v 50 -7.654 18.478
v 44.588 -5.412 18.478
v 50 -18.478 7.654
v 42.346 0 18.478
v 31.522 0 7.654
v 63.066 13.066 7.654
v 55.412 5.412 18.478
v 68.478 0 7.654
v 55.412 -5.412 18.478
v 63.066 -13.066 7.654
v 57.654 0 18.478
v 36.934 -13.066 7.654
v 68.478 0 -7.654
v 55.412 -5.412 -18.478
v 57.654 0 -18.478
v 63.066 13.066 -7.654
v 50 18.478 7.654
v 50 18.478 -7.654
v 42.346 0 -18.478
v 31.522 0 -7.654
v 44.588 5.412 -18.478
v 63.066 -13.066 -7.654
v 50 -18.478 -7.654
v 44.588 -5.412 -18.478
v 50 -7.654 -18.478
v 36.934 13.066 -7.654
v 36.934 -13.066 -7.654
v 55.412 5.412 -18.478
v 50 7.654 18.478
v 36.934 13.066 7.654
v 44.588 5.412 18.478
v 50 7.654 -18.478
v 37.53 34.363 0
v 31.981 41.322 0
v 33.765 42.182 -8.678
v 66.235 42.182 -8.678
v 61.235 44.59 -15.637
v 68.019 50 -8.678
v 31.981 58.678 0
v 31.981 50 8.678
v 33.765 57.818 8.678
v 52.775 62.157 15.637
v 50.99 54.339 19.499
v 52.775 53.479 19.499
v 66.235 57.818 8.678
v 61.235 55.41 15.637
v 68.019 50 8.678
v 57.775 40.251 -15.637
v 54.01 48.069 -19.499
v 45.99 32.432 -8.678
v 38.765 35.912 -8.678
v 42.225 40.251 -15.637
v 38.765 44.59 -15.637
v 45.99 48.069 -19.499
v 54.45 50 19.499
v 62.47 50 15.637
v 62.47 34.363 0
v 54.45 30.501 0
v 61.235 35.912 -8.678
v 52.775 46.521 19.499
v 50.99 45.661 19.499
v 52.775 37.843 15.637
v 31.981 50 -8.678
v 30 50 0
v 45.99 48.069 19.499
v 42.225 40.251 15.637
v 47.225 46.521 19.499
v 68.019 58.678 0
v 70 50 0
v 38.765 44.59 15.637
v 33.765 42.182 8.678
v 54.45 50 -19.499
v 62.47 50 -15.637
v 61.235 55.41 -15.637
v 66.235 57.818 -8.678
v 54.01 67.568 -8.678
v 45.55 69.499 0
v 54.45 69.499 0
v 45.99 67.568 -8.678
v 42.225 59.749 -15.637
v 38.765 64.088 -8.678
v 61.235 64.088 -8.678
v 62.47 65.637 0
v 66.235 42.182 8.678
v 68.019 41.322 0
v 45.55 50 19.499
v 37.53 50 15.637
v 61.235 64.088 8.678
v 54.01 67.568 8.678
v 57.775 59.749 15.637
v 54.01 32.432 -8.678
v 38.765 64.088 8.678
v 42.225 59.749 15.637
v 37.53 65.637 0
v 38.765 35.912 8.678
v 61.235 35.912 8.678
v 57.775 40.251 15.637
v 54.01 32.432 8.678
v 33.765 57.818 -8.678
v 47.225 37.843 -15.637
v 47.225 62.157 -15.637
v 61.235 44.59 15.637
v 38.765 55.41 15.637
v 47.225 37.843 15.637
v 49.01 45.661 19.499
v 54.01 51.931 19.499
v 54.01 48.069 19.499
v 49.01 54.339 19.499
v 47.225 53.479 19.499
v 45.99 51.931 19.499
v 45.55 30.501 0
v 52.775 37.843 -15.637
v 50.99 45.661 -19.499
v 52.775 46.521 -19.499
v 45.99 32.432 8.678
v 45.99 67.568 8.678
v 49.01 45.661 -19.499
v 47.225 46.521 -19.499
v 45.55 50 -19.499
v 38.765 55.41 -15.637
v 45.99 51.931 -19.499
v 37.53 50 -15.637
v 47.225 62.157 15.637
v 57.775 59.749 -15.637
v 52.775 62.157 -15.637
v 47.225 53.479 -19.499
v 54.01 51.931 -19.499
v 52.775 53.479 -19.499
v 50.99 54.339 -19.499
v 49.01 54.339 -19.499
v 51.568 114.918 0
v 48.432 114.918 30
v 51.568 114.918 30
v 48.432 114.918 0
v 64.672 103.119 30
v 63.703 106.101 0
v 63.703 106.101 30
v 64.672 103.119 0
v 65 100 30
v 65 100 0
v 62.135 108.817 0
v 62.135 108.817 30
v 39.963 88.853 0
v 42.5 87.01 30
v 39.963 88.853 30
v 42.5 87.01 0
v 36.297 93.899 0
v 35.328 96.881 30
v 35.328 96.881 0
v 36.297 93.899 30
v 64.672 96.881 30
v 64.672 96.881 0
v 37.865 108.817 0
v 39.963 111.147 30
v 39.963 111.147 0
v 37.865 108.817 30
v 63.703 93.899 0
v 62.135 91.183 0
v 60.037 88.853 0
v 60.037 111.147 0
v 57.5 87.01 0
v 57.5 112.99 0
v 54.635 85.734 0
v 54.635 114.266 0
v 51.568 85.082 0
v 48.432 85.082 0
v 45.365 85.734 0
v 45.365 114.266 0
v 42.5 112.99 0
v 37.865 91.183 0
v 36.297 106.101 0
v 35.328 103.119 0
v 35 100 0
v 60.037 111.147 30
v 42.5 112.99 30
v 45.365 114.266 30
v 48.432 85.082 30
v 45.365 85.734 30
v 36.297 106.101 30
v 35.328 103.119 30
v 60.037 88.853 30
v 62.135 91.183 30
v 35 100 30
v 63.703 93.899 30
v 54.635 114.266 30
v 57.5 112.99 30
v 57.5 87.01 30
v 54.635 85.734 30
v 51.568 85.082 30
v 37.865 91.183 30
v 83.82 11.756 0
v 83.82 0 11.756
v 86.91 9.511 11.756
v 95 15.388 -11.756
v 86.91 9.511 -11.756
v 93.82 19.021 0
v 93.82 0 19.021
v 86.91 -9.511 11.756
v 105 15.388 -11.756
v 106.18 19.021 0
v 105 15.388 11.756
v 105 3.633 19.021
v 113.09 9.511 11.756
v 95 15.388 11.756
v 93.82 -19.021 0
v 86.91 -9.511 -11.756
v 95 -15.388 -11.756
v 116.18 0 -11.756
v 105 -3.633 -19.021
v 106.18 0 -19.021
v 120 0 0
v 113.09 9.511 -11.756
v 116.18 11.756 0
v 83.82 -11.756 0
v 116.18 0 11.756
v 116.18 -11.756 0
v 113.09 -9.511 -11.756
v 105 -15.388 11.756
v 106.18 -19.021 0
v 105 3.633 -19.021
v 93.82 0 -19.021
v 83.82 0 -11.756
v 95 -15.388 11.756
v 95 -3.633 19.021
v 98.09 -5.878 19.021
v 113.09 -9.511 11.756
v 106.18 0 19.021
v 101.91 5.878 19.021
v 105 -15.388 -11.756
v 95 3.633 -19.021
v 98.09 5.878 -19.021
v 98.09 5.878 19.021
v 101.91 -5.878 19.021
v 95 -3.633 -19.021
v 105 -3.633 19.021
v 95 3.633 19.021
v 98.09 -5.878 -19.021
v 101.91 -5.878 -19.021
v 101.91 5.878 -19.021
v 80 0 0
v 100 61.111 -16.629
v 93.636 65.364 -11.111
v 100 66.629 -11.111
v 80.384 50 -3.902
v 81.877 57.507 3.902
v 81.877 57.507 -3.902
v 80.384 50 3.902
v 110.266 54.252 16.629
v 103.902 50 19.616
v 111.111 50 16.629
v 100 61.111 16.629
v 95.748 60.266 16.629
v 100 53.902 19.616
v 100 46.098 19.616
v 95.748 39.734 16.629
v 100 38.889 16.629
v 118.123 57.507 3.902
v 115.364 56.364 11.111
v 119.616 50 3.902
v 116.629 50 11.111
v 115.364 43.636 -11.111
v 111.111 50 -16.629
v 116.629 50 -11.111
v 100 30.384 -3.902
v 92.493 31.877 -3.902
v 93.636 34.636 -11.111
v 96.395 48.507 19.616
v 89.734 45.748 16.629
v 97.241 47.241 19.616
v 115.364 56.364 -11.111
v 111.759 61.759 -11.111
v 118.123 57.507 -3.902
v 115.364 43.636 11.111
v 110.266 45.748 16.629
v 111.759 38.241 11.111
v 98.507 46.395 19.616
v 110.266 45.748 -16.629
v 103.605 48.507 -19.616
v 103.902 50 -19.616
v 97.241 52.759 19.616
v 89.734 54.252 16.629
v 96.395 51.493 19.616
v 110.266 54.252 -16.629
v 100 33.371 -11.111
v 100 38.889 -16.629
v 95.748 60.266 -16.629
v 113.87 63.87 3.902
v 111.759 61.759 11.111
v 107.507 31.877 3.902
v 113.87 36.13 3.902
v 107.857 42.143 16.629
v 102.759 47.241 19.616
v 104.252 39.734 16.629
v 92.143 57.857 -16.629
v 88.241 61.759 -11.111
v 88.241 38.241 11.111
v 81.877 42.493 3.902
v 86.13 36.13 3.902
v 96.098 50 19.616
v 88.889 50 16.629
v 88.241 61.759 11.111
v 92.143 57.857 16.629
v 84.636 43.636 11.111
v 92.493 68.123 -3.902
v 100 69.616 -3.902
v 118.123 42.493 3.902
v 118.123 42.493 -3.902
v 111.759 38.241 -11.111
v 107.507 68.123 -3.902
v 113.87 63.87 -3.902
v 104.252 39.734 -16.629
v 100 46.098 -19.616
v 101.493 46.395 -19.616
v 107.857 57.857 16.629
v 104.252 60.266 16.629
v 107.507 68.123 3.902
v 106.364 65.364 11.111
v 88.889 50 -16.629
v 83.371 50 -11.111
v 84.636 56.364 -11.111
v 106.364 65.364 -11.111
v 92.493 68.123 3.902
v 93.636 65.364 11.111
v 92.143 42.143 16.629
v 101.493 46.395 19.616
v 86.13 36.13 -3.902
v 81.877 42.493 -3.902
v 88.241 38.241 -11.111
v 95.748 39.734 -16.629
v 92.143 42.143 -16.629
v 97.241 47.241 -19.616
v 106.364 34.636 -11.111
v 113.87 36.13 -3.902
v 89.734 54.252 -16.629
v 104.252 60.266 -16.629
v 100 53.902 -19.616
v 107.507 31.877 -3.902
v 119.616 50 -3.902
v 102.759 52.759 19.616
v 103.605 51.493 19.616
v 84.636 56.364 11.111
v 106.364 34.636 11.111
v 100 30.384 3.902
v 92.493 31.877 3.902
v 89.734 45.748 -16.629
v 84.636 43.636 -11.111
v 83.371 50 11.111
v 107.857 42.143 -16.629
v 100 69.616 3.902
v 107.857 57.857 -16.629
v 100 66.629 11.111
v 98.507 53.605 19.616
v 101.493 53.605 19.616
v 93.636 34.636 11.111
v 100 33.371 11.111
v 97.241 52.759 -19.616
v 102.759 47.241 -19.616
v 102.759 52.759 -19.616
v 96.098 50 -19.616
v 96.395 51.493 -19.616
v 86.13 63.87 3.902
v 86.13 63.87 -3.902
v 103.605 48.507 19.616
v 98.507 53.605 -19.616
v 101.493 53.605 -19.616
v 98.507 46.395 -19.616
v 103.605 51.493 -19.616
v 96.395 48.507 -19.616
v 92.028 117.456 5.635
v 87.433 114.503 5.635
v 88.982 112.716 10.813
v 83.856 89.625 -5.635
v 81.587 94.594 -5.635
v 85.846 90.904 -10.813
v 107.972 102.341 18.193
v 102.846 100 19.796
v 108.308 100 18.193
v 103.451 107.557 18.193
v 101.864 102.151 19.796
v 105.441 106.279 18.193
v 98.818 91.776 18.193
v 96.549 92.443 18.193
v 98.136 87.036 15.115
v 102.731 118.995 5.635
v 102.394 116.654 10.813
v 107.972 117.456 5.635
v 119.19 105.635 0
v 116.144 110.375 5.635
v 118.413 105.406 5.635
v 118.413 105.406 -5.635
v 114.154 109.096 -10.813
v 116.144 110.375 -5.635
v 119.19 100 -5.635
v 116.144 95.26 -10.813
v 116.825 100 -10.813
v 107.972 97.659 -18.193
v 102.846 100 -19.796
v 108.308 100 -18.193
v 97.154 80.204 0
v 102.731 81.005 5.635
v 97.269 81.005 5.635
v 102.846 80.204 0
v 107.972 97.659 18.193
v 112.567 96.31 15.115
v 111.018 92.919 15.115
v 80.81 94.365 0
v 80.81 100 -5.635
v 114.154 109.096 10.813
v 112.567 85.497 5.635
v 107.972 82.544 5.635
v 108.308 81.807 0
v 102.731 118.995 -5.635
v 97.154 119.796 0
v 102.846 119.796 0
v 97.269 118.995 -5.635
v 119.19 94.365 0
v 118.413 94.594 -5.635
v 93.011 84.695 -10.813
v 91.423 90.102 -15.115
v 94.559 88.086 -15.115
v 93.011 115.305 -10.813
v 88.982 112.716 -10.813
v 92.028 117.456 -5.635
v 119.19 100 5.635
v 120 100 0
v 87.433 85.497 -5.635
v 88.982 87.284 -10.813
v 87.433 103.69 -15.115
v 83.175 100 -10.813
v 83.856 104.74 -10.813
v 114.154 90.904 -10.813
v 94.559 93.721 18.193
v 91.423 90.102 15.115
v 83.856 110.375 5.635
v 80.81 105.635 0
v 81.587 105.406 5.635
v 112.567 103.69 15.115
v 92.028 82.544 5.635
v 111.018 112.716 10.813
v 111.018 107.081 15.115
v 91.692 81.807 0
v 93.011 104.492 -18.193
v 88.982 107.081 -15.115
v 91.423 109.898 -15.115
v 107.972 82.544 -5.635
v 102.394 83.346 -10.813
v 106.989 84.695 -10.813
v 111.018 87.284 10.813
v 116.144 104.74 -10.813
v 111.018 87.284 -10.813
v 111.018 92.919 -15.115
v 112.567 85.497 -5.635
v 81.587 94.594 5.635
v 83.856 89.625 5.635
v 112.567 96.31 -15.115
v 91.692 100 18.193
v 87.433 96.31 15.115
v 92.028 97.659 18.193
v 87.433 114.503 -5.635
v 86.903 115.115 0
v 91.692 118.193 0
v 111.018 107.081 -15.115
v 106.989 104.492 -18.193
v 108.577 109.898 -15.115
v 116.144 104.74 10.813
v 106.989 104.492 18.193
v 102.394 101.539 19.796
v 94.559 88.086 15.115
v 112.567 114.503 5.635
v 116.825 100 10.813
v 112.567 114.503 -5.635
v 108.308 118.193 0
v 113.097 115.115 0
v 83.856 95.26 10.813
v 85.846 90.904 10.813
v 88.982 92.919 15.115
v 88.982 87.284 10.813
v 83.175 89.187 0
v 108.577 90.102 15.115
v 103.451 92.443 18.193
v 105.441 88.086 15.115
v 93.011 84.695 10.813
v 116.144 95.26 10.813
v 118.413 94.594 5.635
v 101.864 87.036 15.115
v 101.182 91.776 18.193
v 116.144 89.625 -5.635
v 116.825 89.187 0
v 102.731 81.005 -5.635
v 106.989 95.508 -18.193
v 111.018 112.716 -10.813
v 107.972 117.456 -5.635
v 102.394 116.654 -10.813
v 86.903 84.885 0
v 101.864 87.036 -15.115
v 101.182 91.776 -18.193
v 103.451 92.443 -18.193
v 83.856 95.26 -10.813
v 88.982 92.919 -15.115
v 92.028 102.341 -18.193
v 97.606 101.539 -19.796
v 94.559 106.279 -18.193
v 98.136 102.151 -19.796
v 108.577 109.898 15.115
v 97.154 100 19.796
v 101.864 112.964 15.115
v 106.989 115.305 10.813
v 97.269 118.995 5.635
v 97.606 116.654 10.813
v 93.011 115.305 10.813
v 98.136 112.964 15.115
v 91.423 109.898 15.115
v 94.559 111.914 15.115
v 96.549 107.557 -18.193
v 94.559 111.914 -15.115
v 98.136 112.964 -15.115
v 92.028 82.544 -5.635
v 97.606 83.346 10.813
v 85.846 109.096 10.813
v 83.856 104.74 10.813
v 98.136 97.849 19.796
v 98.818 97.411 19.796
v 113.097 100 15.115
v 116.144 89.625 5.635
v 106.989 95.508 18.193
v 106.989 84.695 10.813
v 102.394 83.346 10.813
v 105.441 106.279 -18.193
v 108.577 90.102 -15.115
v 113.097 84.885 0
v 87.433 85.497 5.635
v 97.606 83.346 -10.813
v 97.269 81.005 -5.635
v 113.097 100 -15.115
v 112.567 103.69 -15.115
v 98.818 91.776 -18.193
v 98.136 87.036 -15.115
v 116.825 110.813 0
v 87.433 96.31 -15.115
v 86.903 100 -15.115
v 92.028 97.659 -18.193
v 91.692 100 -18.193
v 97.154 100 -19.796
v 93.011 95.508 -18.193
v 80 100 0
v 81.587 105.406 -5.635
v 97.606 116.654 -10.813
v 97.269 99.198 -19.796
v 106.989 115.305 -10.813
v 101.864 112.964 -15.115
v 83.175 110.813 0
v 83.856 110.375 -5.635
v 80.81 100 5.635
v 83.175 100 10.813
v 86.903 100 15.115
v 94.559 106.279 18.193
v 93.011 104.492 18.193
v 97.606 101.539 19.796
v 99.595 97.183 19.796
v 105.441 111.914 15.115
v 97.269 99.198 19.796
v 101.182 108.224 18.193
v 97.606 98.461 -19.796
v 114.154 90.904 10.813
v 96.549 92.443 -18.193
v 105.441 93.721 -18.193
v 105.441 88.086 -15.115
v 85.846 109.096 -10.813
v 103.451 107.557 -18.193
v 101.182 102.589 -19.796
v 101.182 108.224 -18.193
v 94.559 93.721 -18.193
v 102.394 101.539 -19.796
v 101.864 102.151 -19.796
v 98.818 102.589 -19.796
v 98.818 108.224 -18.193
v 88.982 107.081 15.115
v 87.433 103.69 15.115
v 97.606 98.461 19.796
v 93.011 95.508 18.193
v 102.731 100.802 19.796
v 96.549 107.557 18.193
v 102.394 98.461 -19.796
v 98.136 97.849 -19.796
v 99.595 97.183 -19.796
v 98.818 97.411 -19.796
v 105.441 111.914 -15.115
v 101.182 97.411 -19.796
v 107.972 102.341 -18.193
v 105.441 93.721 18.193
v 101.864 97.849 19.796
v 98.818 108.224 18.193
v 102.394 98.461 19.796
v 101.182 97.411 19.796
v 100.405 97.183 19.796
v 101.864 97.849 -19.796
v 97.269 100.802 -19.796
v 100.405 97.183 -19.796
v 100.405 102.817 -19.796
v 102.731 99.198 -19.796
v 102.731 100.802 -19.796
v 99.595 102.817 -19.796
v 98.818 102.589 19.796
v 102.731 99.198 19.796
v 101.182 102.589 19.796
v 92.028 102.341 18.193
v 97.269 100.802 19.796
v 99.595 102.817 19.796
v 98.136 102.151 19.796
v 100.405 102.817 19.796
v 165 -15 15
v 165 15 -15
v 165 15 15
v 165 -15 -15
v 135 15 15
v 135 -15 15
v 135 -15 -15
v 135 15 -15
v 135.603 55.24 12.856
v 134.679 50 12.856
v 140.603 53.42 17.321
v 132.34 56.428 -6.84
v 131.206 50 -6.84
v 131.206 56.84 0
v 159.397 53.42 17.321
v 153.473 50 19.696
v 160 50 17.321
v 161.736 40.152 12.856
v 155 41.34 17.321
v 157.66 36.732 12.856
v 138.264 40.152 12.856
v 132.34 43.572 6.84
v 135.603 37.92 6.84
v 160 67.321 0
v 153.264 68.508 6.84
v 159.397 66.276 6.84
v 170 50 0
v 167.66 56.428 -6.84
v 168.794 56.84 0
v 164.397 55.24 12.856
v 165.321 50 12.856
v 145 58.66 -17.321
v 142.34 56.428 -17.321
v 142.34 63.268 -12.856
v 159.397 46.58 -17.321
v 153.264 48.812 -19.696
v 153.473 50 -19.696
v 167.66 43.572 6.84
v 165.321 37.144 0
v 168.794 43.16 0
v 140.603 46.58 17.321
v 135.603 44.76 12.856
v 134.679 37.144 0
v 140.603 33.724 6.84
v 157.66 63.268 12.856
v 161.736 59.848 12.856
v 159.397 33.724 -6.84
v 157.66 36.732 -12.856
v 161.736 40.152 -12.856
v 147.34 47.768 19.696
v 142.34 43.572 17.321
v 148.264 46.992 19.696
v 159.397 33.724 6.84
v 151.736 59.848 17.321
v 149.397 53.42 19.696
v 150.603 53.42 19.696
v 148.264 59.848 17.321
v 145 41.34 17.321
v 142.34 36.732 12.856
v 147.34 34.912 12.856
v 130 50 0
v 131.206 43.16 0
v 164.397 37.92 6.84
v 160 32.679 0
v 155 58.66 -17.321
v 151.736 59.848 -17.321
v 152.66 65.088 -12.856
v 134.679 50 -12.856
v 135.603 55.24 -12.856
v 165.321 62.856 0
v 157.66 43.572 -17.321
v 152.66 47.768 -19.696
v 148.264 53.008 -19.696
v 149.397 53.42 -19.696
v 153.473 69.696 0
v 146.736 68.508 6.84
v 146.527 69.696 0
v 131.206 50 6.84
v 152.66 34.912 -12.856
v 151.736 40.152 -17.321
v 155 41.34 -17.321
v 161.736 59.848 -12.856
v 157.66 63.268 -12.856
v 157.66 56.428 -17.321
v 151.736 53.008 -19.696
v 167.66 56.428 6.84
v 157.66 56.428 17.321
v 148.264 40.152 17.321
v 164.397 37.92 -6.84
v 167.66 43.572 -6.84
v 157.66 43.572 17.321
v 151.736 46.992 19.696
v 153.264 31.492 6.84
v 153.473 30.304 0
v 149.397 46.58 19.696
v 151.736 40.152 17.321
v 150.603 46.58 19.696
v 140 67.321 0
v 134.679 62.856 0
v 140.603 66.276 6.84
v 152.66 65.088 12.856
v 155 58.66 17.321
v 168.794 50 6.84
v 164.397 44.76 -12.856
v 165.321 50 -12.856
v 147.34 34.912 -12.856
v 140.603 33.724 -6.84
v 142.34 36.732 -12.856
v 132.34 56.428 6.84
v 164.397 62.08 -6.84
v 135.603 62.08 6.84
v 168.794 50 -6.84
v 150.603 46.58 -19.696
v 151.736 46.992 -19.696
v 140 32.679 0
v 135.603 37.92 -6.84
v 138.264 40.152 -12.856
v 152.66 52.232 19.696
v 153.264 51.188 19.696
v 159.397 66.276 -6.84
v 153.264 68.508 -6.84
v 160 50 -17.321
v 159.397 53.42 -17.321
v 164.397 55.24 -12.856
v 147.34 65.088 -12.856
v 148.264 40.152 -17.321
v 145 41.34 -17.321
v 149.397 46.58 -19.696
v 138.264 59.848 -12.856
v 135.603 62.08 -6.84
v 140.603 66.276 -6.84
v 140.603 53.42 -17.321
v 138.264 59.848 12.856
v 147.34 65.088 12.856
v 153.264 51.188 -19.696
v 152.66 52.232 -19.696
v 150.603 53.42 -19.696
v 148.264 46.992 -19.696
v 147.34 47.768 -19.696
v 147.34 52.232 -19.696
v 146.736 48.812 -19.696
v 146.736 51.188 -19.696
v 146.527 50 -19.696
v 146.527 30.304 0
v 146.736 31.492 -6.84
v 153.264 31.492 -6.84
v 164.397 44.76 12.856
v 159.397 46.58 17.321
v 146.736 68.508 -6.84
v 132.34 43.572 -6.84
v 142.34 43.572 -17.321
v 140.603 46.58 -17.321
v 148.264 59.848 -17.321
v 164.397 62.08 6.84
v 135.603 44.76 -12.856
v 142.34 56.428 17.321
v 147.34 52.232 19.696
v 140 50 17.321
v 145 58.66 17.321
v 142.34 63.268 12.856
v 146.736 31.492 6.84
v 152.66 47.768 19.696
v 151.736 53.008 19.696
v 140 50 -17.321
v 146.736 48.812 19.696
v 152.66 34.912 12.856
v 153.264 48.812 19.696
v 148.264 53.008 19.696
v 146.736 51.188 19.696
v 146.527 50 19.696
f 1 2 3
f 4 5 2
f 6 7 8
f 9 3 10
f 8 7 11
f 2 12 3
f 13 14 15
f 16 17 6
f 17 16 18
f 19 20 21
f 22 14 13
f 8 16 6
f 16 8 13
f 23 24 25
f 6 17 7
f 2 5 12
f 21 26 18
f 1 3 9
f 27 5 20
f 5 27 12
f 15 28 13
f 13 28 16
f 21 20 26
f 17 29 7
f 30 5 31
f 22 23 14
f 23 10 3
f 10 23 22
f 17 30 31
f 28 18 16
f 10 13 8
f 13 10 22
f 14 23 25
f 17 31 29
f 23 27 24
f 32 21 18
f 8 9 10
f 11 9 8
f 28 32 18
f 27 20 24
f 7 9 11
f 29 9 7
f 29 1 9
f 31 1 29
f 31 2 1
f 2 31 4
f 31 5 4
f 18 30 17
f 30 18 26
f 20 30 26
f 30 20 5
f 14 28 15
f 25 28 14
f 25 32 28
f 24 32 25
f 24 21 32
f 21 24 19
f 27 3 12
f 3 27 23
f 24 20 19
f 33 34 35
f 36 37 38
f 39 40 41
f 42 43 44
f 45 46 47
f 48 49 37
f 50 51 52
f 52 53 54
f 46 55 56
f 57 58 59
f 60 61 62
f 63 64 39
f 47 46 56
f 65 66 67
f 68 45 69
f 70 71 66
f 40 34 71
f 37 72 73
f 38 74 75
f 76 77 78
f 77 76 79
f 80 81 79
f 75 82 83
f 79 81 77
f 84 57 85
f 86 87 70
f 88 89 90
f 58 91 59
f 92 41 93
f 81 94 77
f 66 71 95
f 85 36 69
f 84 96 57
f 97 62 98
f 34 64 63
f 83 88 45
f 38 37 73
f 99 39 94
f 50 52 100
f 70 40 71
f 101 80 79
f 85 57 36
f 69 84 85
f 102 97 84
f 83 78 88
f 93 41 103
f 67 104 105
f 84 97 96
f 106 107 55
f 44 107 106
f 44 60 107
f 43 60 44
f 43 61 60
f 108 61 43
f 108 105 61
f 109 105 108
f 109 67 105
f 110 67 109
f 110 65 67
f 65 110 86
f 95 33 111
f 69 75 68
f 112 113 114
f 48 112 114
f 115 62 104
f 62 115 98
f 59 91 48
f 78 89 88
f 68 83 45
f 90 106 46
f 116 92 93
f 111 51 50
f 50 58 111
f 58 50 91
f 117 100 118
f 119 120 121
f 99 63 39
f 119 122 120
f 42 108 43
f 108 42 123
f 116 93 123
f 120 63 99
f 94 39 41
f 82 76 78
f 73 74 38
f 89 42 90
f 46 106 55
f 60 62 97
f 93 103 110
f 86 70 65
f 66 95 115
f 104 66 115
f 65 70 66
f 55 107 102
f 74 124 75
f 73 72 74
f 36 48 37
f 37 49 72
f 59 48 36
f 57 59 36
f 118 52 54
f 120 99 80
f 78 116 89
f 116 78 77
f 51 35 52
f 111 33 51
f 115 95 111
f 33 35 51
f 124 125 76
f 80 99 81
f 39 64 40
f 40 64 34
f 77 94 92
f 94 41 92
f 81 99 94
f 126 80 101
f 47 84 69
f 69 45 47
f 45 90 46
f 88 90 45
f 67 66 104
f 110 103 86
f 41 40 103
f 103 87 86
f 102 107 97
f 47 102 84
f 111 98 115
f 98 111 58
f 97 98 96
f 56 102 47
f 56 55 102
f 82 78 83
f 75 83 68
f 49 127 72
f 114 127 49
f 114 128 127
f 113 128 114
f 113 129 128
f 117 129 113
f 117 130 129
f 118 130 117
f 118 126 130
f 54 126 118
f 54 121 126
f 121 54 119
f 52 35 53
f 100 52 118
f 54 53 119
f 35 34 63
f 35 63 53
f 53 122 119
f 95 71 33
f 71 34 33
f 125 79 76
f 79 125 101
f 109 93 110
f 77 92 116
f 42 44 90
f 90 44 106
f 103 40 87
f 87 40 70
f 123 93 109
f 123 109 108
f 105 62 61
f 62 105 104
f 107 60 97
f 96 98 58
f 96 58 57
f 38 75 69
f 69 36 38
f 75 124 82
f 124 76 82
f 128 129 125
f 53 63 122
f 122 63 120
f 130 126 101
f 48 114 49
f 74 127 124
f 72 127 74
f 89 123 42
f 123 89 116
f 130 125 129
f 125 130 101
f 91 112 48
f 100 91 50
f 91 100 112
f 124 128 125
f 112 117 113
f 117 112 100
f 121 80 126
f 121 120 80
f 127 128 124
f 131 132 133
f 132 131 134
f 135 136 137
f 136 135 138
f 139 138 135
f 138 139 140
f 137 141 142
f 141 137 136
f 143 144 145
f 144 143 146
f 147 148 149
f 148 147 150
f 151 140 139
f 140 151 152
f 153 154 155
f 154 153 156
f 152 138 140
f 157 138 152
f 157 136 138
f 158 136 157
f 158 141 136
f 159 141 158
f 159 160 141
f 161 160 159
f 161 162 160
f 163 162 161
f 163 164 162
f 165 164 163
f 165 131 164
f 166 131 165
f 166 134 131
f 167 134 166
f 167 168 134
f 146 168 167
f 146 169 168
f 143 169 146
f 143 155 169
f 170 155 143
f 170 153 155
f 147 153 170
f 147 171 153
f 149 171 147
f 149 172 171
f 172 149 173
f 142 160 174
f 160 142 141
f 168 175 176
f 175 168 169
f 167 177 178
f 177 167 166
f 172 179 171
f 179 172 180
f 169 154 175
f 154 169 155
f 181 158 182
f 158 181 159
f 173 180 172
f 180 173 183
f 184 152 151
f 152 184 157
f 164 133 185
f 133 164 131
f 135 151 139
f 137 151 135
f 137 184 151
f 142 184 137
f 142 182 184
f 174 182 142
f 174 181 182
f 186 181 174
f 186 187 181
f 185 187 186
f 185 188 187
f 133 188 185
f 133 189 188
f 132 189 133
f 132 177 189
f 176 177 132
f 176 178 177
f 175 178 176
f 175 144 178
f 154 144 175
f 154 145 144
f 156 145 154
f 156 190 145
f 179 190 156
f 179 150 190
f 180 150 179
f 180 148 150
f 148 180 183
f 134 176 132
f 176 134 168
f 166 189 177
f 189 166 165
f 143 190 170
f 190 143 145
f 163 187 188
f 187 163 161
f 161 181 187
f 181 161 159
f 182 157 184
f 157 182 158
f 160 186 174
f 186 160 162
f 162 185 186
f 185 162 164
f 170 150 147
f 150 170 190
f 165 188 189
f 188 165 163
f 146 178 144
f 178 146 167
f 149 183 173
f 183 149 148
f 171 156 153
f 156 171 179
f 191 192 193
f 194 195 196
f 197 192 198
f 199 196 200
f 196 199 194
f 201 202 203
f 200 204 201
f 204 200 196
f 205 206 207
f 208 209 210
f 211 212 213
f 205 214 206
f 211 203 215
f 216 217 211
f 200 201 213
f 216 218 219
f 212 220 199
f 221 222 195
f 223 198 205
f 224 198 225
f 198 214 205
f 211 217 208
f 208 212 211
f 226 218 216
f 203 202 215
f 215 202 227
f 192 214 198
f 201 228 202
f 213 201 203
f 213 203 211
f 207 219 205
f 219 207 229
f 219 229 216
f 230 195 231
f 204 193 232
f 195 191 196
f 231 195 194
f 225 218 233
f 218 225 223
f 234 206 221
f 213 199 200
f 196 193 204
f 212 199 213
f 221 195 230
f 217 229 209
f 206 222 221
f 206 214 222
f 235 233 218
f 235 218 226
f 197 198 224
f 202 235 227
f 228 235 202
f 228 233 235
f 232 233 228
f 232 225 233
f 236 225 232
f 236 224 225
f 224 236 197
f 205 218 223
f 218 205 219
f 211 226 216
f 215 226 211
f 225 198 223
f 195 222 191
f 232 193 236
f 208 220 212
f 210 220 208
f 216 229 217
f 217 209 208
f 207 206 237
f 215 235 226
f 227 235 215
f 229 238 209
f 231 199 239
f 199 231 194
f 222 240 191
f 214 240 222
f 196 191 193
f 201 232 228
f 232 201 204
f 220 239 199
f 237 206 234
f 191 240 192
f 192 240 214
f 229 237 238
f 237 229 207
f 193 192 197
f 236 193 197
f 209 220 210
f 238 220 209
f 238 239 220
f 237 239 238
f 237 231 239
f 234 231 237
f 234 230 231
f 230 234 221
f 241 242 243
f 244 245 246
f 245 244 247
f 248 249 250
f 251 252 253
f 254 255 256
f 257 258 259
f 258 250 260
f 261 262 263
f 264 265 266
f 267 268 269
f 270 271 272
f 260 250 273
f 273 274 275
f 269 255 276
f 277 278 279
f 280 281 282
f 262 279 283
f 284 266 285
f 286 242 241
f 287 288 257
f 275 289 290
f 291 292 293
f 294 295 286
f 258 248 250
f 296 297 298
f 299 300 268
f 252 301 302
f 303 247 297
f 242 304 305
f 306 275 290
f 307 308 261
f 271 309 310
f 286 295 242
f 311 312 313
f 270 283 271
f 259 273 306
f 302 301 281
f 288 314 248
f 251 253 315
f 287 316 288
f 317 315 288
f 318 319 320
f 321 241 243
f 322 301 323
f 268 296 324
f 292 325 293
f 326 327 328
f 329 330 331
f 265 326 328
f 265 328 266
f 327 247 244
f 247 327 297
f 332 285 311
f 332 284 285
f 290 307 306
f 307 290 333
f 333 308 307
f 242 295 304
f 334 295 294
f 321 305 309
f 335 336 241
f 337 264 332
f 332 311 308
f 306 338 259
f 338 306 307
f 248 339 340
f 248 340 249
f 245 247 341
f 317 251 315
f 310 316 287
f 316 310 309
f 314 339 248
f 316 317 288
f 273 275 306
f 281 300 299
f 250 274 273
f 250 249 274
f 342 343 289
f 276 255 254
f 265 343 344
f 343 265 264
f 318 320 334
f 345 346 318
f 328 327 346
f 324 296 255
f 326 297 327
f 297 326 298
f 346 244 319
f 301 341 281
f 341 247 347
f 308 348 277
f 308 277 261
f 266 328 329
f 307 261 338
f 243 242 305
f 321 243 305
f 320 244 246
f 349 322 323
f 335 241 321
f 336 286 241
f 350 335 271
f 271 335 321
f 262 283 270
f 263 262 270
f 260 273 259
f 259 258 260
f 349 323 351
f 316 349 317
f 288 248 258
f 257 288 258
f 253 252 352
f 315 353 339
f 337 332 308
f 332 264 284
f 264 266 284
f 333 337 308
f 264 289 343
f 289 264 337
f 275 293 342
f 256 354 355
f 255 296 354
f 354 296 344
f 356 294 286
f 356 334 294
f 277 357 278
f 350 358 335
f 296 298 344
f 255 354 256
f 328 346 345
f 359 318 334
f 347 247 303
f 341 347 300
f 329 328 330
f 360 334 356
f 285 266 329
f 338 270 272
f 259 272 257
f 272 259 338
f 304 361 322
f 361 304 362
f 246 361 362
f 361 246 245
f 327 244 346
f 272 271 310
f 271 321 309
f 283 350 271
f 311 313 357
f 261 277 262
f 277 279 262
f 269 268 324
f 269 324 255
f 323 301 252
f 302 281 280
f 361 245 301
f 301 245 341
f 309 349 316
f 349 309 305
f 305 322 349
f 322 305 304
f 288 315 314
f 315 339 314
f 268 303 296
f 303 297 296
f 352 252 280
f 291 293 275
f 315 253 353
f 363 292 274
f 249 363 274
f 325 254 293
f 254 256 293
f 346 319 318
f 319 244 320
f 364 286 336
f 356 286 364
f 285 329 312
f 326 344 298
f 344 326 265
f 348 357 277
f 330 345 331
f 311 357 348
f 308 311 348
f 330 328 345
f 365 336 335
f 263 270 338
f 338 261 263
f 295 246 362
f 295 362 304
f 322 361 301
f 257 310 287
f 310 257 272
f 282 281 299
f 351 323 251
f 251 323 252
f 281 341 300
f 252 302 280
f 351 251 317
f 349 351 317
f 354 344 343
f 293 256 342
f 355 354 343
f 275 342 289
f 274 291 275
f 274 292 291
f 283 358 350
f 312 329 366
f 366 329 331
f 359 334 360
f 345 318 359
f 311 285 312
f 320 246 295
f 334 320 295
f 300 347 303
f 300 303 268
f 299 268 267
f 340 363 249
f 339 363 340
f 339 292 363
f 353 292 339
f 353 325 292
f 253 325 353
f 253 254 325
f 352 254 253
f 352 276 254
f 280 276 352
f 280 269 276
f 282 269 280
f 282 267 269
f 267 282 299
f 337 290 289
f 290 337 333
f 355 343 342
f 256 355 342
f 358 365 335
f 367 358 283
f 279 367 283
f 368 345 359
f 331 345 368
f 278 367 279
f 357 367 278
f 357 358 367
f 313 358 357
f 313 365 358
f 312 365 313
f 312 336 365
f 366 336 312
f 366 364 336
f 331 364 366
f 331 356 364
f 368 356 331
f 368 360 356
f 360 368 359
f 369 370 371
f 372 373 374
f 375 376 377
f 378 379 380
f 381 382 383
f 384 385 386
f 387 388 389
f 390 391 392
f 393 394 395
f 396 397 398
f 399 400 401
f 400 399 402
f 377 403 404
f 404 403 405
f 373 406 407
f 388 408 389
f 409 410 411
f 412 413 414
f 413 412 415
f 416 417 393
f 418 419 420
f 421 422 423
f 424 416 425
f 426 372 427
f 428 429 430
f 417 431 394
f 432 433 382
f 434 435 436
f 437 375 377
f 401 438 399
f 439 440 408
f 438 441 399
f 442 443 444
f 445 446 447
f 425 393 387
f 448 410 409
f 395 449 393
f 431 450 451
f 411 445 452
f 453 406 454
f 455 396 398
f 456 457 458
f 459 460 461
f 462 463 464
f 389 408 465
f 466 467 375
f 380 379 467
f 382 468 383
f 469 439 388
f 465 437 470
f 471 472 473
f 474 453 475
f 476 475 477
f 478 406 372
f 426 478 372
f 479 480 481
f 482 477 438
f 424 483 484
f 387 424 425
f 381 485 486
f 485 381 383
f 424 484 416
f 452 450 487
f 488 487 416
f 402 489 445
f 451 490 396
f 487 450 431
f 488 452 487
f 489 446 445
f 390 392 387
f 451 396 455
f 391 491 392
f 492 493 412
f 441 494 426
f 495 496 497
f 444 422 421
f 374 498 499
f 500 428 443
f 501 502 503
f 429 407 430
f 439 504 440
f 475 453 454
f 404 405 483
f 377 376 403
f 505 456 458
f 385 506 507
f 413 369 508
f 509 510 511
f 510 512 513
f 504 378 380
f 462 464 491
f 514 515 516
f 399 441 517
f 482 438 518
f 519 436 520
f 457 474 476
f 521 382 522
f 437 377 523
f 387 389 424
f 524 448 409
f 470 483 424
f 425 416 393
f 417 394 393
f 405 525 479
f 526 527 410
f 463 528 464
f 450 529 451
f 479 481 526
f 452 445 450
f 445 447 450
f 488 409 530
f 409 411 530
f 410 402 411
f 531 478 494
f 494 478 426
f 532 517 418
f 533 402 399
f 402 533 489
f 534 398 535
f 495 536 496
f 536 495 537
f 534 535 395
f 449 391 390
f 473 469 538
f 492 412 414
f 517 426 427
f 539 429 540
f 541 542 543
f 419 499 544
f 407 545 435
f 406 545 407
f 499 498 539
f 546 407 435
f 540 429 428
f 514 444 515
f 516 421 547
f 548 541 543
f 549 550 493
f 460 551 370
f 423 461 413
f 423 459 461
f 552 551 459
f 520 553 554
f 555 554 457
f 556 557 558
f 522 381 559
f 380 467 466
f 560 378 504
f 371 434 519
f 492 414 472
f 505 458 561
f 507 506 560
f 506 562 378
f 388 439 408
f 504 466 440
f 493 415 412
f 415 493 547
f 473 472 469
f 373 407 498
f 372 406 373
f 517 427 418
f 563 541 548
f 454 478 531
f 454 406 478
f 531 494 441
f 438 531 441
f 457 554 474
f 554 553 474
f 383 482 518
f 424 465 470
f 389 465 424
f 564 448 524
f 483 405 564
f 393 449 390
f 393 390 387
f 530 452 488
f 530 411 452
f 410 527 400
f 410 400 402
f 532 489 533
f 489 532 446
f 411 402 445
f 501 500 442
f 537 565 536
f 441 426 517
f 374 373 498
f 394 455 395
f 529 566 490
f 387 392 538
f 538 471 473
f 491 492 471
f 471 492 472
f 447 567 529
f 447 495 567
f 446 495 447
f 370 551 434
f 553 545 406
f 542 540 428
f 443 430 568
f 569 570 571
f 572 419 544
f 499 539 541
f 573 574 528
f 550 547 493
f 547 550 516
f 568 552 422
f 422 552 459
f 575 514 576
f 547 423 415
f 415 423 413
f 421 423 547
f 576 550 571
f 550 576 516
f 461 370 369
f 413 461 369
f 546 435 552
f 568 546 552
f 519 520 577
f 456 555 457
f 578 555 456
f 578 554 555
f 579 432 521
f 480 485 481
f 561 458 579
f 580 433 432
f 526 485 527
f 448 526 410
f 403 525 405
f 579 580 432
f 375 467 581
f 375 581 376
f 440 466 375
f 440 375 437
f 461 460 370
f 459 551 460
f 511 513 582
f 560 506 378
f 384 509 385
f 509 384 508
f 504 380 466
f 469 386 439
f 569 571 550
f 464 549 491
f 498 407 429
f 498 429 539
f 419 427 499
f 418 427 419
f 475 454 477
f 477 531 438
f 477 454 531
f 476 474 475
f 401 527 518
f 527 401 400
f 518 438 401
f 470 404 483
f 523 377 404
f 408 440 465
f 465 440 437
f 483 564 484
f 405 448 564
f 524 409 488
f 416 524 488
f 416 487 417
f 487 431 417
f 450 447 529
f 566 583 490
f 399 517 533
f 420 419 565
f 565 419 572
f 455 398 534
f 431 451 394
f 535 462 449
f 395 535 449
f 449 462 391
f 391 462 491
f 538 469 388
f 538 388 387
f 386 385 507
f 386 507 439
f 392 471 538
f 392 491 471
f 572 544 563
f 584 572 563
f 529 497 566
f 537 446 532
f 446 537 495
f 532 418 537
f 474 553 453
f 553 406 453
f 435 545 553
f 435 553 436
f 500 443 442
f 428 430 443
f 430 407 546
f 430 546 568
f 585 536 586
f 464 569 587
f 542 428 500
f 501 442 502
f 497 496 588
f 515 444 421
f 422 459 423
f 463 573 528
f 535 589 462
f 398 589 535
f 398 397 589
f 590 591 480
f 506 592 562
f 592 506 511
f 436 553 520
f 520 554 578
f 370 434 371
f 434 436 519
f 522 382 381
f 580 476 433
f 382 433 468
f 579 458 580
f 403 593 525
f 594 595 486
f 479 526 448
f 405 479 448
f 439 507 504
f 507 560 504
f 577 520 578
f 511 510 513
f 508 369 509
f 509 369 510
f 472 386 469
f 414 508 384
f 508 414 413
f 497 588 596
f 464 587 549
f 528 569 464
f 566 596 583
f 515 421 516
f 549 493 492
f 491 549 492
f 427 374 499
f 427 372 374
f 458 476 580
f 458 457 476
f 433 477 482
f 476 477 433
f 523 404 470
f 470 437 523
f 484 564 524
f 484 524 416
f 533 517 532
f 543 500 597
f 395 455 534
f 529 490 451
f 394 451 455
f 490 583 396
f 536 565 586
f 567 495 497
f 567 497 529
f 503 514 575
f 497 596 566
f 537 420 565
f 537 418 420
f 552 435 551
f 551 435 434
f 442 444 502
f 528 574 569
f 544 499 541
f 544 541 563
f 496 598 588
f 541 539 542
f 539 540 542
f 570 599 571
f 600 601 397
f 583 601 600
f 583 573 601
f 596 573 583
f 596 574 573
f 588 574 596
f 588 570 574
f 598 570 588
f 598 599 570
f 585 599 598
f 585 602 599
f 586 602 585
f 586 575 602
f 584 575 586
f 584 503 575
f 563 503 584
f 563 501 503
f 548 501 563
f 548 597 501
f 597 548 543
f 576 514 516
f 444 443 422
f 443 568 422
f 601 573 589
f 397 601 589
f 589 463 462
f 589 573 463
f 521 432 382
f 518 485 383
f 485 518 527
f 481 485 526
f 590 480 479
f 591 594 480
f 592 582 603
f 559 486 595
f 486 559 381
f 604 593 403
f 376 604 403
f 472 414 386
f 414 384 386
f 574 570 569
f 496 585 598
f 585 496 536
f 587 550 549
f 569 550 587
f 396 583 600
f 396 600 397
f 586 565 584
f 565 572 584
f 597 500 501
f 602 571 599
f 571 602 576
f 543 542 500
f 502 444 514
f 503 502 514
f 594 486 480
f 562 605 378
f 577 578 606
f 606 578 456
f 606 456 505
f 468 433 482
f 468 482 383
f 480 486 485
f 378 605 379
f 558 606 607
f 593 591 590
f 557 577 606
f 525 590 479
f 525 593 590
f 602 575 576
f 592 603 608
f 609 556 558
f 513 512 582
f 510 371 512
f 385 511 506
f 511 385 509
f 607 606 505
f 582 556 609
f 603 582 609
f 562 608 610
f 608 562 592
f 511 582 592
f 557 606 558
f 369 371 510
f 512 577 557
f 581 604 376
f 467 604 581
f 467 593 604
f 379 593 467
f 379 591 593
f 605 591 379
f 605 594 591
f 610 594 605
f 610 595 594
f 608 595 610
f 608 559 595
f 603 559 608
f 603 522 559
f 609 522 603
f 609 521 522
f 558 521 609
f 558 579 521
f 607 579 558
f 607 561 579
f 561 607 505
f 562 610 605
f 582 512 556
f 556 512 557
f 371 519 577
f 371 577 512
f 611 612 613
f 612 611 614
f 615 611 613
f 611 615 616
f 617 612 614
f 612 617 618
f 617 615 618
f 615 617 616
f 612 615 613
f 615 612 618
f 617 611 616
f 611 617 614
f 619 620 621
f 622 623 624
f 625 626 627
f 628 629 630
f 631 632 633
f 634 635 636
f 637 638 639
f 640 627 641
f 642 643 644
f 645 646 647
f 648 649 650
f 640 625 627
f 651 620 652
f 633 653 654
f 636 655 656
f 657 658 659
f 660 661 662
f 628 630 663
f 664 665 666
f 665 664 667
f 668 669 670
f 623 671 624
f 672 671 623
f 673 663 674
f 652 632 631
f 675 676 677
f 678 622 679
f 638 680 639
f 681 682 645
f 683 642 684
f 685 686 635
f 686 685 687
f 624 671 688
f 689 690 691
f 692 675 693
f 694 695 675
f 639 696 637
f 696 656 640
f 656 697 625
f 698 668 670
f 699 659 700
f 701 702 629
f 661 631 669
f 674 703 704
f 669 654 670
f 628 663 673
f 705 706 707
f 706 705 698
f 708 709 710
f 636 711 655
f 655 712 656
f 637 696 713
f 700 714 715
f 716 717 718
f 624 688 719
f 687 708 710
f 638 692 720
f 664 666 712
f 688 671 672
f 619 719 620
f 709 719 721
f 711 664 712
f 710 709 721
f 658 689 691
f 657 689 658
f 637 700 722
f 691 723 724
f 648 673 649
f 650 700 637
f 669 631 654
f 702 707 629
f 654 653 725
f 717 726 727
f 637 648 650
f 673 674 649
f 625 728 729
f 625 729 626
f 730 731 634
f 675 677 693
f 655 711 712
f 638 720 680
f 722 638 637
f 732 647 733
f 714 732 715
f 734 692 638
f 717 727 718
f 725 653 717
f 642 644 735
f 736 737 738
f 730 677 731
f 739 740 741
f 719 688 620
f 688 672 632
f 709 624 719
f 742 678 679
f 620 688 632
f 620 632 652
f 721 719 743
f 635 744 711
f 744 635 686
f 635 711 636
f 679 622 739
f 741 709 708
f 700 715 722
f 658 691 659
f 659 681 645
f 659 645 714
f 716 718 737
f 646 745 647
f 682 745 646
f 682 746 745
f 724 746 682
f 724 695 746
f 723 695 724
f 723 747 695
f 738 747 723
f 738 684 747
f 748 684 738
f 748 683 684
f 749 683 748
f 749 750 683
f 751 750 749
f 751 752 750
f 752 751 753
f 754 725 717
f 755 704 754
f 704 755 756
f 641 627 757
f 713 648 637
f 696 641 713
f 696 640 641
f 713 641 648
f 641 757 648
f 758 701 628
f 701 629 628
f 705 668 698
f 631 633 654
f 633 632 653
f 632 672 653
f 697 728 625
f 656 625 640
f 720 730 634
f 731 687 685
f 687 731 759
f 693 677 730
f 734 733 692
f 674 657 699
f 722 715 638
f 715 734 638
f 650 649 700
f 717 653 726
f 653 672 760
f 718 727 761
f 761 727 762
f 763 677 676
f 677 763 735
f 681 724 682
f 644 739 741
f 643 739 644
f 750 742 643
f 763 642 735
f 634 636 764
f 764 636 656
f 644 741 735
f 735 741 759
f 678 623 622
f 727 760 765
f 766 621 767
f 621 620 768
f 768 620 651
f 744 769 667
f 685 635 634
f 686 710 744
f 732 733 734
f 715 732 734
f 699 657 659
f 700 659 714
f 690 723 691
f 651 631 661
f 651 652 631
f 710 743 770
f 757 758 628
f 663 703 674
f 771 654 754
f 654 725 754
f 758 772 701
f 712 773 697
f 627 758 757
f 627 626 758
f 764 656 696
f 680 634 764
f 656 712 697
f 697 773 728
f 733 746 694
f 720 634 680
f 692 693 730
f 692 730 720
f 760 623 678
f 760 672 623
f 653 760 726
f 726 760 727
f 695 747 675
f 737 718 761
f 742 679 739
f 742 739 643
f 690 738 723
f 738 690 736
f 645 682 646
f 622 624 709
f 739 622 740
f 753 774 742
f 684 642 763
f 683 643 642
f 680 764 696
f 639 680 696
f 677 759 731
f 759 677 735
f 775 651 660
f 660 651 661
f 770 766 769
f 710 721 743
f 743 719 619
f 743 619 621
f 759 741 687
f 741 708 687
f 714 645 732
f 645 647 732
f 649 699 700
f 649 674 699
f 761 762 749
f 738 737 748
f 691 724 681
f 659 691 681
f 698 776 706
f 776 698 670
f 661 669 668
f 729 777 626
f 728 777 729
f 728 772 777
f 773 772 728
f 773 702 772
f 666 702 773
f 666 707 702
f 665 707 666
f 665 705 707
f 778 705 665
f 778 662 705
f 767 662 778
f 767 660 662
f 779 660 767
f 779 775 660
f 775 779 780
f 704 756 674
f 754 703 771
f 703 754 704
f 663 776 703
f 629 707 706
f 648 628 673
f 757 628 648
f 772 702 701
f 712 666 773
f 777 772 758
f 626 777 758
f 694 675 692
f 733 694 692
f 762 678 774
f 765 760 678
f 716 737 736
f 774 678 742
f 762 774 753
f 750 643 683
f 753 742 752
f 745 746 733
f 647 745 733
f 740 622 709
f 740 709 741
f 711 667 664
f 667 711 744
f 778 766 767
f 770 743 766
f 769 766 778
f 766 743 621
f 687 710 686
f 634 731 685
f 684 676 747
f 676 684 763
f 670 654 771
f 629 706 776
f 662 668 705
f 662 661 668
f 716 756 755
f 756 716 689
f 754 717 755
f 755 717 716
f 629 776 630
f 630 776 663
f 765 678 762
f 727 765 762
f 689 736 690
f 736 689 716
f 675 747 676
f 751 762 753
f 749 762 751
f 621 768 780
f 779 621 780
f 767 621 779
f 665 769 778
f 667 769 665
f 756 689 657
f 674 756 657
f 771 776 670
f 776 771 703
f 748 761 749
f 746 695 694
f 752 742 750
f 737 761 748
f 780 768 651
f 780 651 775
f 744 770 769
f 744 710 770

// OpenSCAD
 // Arrange its children in a regular rectangular array
 //      spacing - the space between children origins
 //      n       - the number of children along x axis
 module Arrange(spacing=50, n=5) {
    nparts = $children;
    for(i=[0:1:n-1], j=[0:nparts/n])
        if (i+n*j < nparts)
            translate([spacing*(i+1), spacing*j, 0]) 
                children(i+n*j);
 }

 Arrange(spacing=50,n=3) {
    sphere(r=20,$fn=8);
    sphere(r=20,$fn=10);
    cube(30,center=true);
    sphere(r=20,$fn=14);
    sphere(r=20,$fn=16);
    sphere(r=20,$fn=18);
    cylinder(r=15,h=30);
    sphere(r=20,$fn=22);
 }
